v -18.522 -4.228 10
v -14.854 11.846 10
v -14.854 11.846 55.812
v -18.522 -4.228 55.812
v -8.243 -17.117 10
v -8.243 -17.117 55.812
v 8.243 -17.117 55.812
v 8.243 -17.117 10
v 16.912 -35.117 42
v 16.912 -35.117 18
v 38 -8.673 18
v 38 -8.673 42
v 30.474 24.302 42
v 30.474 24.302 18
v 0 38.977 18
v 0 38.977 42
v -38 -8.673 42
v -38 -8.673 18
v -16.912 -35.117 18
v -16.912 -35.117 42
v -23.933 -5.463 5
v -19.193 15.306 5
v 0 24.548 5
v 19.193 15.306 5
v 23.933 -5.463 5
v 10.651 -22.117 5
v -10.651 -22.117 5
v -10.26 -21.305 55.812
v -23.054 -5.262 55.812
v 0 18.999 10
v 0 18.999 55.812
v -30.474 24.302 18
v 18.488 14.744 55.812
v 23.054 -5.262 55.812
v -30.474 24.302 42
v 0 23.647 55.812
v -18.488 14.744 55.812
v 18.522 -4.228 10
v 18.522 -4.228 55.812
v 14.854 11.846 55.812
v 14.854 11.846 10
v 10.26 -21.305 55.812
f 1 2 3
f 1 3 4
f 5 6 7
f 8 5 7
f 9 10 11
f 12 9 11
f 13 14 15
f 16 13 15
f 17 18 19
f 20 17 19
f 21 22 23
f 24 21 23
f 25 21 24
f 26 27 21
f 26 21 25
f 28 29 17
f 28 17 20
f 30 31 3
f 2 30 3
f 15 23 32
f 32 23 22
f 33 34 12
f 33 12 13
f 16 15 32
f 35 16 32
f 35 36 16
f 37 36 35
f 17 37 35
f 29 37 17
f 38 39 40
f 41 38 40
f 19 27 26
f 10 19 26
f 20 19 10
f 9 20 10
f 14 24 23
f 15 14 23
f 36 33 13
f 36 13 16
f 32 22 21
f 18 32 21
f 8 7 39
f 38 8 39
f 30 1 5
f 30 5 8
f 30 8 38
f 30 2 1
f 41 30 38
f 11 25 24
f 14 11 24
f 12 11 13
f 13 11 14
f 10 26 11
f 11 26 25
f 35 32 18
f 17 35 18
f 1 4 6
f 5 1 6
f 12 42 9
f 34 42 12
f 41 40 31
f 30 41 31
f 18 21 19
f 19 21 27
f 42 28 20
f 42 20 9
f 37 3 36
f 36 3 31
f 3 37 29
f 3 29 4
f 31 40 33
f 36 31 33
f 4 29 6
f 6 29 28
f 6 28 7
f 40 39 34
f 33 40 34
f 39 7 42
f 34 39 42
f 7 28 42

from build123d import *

# Parameters (mm, degrees)
F1_DEPTH = 60
F2_SIZE  = 18
F4_DEPTH = 50
F6_W     = 58.8767696172
F6_H     = 9.2865563929
F7_DEPTH = 90
F8_W     = 55
F8_H     = 5
F9_DEPTH = 100


with BuildPart() as f1:
    # F0 (on Top) → F1 (new body)
    with BuildSketch(Plane.XY):
        Polygon((-16.9115909807, -35.1172805215), (16.9115909807, -35.1172805215), (38, -8.6732520268), (30.4736339606, 24.3019121461), (0, 38.9772408044), (-30.4736339606, 24.3019121461), (-38, -8.6732520268), align=None)
    extrude(amount=F1_DEPTH)

    # F2
    f2_edges = [f1.edges().sort_by_distance(p)[0] for p in [
        (0, -35.117281, 0),
        (27.455795, -21.895266, 0),
        (34.236817, 7.81433, 0),
        (15.236817, 31.639576, 0),
        (-15.236817, 31.639576, 0),
        (-34.236817, 7.81433, 0),
        (-27.455795, -21.895266, 0),
        (0, -35.117281, 60),
        (27.455795, -21.895266, 60),
        (34.236817, 7.81433, 60),
        (15.236817, 31.639576, 60),
        (-15.236817, 31.639576, 60),
        (-34.236817, 7.81433, 60),
        (-27.455795, -21.895266, 60),
    ]]
    chamfer(f2_edges, length=F2_SIZE)

    # F3 (on face) → F4 (cut)
    with BuildSketch(Plane.XY.offset(60)):
        Polygon((-18.5224097697, -4.2276191599), (-8.2432478421, -17.1172805215), (8.2432478421, -17.1172805215), (18.5224097697, -4.2276191599), (14.8538193524, 11.8455256568), (0, 18.9987480492), (-14.8538193524, 11.8455256568), align=None)
    extrude(amount=-F4_DEPTH, mode=Mode.SUBTRACT)

    # F6 (on offset) → F7 (cut)
    with BuildSketch(Plane.XZ.offset(45)):
        with Locations((0.9286543354, 60.4554843158)):
            Rectangle(F6_W, F6_H)
    extrude(amount=-F7_DEPTH, mode=Mode.SUBTRACT)

    # F8 (on offset) → F9 (cut)
    with BuildSketch(Plane.XZ.offset(45)):
        with Locations((3.5671484997, 2.5)):
            Rectangle(F8_W, F8_H)
    extrude(amount=-F9_DEPTH, mode=Mode.SUBTRACT)


solid = f1.part
